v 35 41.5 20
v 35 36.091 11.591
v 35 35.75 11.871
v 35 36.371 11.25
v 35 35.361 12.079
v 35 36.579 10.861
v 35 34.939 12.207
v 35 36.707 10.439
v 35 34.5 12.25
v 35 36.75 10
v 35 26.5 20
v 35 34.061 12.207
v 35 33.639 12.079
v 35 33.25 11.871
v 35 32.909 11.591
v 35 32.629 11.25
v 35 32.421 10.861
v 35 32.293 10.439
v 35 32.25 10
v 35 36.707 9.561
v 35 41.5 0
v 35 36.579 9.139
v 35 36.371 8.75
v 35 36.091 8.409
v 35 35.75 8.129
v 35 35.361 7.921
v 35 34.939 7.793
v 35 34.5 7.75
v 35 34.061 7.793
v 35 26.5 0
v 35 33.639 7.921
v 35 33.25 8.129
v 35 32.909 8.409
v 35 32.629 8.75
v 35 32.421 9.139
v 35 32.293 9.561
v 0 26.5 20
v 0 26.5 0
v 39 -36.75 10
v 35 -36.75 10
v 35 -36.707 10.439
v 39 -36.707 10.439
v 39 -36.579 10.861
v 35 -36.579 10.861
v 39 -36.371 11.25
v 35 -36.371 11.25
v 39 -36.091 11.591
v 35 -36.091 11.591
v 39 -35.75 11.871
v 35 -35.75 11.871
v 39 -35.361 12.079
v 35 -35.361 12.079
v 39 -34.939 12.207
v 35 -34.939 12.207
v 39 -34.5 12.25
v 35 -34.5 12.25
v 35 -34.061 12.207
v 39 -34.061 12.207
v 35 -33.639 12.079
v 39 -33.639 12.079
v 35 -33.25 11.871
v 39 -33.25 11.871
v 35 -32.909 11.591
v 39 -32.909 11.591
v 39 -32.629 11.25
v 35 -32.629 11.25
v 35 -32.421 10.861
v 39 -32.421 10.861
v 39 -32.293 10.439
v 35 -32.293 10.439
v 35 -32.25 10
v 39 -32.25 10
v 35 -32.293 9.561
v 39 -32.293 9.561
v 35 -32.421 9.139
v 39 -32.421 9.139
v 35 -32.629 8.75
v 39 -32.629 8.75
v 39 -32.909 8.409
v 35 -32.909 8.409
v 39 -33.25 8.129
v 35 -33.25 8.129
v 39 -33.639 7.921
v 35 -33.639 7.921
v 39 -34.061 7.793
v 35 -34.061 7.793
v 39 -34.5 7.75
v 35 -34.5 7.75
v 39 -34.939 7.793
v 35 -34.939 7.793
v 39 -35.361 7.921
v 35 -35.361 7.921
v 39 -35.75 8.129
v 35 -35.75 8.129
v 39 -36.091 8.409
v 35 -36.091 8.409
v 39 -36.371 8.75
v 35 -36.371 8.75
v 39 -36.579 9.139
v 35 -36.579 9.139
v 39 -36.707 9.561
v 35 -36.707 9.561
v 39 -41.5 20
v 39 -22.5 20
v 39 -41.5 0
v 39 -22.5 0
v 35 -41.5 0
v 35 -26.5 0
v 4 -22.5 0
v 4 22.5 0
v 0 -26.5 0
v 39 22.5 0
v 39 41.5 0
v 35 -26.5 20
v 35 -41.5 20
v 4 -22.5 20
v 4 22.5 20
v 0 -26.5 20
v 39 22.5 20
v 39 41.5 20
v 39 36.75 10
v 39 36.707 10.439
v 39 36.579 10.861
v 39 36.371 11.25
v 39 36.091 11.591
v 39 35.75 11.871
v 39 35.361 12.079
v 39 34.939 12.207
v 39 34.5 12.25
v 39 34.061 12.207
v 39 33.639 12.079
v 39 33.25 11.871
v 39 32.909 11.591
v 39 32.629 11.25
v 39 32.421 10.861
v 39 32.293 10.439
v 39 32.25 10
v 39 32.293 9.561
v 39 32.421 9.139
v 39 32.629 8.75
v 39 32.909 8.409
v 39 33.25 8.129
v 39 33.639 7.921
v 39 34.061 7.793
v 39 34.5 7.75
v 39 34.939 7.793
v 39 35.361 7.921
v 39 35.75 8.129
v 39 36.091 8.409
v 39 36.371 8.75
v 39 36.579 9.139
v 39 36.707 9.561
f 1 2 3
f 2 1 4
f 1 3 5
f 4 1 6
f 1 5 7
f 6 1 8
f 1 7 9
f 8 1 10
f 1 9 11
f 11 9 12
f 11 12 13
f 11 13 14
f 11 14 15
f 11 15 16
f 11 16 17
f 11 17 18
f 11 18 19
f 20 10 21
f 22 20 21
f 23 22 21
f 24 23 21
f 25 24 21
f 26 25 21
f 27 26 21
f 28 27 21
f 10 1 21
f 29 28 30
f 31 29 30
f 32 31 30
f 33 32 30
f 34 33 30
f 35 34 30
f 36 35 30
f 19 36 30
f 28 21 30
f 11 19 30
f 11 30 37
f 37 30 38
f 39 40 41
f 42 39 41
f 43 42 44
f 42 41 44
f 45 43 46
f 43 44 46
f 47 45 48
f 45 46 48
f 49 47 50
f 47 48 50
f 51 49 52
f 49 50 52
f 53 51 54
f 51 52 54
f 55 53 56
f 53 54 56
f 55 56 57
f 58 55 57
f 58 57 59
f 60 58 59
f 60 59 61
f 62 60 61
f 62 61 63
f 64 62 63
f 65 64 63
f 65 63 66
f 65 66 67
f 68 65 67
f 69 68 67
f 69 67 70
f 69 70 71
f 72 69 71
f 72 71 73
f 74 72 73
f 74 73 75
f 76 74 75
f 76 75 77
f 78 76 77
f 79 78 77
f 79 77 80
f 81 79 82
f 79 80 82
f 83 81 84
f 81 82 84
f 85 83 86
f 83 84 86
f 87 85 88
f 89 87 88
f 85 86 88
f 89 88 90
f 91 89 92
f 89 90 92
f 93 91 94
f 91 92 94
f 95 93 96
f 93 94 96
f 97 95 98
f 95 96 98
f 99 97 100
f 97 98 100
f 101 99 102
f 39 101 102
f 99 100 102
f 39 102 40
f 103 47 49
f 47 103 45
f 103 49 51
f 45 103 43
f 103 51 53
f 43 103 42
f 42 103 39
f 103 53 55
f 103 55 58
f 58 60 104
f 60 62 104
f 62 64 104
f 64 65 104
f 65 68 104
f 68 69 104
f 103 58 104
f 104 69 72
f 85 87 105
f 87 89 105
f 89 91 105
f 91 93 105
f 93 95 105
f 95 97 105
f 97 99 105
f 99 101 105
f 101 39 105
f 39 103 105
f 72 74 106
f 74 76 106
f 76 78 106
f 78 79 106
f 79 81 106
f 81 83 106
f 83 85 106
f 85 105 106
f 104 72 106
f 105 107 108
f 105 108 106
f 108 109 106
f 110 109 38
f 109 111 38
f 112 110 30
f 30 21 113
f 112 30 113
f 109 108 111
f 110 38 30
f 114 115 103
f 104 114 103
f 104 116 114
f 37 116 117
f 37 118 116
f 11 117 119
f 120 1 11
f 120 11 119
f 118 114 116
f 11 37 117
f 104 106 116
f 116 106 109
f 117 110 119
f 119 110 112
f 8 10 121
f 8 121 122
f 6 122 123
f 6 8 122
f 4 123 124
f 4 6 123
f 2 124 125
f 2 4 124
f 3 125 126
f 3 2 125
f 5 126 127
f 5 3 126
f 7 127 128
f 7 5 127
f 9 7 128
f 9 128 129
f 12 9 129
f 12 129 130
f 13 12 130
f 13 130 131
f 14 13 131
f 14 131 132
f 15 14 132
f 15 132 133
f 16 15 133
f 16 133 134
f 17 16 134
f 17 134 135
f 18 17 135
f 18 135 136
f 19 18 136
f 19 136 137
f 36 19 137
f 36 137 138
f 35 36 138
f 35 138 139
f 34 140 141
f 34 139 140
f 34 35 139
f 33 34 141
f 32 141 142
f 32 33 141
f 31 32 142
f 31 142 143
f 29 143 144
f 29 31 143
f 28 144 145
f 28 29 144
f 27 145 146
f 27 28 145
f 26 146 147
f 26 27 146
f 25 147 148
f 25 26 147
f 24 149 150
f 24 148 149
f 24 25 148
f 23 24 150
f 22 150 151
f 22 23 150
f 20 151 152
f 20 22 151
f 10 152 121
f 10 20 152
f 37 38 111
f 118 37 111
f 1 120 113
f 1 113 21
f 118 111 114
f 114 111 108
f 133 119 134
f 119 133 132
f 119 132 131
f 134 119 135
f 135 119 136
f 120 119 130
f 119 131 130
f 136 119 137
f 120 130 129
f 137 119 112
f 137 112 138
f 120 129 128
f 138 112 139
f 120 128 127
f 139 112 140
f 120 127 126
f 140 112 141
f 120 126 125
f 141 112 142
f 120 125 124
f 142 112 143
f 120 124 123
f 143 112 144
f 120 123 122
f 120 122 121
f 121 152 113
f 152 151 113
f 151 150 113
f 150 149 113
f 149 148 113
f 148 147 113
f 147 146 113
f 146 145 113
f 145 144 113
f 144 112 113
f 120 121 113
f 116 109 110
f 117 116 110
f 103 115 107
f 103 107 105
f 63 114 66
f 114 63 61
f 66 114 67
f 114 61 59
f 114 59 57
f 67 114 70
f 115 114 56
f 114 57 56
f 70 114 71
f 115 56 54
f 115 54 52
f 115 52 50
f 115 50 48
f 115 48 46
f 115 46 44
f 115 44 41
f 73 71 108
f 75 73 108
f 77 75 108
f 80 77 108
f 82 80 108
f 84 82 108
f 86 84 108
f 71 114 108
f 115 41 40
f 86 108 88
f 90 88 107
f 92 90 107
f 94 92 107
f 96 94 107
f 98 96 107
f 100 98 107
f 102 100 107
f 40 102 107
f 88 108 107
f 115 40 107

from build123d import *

# Parameters (mm, degrees)
F1_DEPTH = 20
F2_R     = 2.25
F3_DEPTH = 39.001


# Not quite as in the source:
# - a pattern or mirror of a feature is missing from the dataset's text; its kind, count and spacing are read off the source's solid


with BuildPart() as f1:
    # F0 (on Top) → F1 (new body)
    with BuildSketch(Plane.XY):
        Polygon((0, 26.5), (0, 0), (4, 0), (4, 22.5), (39, 22.5), (39, 41.5), (35, 41.5), (35, 26.5), align=None)
        Polygon((4, 0), (0, 0), (0, -26.5), (35, -26.5), (35, -41.5), (39, -41.5), (39, -22.5), (4, -22.5), align=None)
    extrude(amount=F1_DEPTH)

    # F2 (on Right) → F3 (cut, through all)
    with BuildSketch(Plane.YZ):
        with Locations((34.5, 10)):
            Circle(F2_R)
    f3 = extrude(amount=F3_DEPTH, mode=Mode.SUBTRACT)

    # F3_copies: F3 across plane
    add(f3.mirror(Plane(origin=(0, 0, 0), x_dir=(0, 0, -1), z_dir=(0, -1, 0))), mode=Mode.SUBTRACT)


solid = f1.part
